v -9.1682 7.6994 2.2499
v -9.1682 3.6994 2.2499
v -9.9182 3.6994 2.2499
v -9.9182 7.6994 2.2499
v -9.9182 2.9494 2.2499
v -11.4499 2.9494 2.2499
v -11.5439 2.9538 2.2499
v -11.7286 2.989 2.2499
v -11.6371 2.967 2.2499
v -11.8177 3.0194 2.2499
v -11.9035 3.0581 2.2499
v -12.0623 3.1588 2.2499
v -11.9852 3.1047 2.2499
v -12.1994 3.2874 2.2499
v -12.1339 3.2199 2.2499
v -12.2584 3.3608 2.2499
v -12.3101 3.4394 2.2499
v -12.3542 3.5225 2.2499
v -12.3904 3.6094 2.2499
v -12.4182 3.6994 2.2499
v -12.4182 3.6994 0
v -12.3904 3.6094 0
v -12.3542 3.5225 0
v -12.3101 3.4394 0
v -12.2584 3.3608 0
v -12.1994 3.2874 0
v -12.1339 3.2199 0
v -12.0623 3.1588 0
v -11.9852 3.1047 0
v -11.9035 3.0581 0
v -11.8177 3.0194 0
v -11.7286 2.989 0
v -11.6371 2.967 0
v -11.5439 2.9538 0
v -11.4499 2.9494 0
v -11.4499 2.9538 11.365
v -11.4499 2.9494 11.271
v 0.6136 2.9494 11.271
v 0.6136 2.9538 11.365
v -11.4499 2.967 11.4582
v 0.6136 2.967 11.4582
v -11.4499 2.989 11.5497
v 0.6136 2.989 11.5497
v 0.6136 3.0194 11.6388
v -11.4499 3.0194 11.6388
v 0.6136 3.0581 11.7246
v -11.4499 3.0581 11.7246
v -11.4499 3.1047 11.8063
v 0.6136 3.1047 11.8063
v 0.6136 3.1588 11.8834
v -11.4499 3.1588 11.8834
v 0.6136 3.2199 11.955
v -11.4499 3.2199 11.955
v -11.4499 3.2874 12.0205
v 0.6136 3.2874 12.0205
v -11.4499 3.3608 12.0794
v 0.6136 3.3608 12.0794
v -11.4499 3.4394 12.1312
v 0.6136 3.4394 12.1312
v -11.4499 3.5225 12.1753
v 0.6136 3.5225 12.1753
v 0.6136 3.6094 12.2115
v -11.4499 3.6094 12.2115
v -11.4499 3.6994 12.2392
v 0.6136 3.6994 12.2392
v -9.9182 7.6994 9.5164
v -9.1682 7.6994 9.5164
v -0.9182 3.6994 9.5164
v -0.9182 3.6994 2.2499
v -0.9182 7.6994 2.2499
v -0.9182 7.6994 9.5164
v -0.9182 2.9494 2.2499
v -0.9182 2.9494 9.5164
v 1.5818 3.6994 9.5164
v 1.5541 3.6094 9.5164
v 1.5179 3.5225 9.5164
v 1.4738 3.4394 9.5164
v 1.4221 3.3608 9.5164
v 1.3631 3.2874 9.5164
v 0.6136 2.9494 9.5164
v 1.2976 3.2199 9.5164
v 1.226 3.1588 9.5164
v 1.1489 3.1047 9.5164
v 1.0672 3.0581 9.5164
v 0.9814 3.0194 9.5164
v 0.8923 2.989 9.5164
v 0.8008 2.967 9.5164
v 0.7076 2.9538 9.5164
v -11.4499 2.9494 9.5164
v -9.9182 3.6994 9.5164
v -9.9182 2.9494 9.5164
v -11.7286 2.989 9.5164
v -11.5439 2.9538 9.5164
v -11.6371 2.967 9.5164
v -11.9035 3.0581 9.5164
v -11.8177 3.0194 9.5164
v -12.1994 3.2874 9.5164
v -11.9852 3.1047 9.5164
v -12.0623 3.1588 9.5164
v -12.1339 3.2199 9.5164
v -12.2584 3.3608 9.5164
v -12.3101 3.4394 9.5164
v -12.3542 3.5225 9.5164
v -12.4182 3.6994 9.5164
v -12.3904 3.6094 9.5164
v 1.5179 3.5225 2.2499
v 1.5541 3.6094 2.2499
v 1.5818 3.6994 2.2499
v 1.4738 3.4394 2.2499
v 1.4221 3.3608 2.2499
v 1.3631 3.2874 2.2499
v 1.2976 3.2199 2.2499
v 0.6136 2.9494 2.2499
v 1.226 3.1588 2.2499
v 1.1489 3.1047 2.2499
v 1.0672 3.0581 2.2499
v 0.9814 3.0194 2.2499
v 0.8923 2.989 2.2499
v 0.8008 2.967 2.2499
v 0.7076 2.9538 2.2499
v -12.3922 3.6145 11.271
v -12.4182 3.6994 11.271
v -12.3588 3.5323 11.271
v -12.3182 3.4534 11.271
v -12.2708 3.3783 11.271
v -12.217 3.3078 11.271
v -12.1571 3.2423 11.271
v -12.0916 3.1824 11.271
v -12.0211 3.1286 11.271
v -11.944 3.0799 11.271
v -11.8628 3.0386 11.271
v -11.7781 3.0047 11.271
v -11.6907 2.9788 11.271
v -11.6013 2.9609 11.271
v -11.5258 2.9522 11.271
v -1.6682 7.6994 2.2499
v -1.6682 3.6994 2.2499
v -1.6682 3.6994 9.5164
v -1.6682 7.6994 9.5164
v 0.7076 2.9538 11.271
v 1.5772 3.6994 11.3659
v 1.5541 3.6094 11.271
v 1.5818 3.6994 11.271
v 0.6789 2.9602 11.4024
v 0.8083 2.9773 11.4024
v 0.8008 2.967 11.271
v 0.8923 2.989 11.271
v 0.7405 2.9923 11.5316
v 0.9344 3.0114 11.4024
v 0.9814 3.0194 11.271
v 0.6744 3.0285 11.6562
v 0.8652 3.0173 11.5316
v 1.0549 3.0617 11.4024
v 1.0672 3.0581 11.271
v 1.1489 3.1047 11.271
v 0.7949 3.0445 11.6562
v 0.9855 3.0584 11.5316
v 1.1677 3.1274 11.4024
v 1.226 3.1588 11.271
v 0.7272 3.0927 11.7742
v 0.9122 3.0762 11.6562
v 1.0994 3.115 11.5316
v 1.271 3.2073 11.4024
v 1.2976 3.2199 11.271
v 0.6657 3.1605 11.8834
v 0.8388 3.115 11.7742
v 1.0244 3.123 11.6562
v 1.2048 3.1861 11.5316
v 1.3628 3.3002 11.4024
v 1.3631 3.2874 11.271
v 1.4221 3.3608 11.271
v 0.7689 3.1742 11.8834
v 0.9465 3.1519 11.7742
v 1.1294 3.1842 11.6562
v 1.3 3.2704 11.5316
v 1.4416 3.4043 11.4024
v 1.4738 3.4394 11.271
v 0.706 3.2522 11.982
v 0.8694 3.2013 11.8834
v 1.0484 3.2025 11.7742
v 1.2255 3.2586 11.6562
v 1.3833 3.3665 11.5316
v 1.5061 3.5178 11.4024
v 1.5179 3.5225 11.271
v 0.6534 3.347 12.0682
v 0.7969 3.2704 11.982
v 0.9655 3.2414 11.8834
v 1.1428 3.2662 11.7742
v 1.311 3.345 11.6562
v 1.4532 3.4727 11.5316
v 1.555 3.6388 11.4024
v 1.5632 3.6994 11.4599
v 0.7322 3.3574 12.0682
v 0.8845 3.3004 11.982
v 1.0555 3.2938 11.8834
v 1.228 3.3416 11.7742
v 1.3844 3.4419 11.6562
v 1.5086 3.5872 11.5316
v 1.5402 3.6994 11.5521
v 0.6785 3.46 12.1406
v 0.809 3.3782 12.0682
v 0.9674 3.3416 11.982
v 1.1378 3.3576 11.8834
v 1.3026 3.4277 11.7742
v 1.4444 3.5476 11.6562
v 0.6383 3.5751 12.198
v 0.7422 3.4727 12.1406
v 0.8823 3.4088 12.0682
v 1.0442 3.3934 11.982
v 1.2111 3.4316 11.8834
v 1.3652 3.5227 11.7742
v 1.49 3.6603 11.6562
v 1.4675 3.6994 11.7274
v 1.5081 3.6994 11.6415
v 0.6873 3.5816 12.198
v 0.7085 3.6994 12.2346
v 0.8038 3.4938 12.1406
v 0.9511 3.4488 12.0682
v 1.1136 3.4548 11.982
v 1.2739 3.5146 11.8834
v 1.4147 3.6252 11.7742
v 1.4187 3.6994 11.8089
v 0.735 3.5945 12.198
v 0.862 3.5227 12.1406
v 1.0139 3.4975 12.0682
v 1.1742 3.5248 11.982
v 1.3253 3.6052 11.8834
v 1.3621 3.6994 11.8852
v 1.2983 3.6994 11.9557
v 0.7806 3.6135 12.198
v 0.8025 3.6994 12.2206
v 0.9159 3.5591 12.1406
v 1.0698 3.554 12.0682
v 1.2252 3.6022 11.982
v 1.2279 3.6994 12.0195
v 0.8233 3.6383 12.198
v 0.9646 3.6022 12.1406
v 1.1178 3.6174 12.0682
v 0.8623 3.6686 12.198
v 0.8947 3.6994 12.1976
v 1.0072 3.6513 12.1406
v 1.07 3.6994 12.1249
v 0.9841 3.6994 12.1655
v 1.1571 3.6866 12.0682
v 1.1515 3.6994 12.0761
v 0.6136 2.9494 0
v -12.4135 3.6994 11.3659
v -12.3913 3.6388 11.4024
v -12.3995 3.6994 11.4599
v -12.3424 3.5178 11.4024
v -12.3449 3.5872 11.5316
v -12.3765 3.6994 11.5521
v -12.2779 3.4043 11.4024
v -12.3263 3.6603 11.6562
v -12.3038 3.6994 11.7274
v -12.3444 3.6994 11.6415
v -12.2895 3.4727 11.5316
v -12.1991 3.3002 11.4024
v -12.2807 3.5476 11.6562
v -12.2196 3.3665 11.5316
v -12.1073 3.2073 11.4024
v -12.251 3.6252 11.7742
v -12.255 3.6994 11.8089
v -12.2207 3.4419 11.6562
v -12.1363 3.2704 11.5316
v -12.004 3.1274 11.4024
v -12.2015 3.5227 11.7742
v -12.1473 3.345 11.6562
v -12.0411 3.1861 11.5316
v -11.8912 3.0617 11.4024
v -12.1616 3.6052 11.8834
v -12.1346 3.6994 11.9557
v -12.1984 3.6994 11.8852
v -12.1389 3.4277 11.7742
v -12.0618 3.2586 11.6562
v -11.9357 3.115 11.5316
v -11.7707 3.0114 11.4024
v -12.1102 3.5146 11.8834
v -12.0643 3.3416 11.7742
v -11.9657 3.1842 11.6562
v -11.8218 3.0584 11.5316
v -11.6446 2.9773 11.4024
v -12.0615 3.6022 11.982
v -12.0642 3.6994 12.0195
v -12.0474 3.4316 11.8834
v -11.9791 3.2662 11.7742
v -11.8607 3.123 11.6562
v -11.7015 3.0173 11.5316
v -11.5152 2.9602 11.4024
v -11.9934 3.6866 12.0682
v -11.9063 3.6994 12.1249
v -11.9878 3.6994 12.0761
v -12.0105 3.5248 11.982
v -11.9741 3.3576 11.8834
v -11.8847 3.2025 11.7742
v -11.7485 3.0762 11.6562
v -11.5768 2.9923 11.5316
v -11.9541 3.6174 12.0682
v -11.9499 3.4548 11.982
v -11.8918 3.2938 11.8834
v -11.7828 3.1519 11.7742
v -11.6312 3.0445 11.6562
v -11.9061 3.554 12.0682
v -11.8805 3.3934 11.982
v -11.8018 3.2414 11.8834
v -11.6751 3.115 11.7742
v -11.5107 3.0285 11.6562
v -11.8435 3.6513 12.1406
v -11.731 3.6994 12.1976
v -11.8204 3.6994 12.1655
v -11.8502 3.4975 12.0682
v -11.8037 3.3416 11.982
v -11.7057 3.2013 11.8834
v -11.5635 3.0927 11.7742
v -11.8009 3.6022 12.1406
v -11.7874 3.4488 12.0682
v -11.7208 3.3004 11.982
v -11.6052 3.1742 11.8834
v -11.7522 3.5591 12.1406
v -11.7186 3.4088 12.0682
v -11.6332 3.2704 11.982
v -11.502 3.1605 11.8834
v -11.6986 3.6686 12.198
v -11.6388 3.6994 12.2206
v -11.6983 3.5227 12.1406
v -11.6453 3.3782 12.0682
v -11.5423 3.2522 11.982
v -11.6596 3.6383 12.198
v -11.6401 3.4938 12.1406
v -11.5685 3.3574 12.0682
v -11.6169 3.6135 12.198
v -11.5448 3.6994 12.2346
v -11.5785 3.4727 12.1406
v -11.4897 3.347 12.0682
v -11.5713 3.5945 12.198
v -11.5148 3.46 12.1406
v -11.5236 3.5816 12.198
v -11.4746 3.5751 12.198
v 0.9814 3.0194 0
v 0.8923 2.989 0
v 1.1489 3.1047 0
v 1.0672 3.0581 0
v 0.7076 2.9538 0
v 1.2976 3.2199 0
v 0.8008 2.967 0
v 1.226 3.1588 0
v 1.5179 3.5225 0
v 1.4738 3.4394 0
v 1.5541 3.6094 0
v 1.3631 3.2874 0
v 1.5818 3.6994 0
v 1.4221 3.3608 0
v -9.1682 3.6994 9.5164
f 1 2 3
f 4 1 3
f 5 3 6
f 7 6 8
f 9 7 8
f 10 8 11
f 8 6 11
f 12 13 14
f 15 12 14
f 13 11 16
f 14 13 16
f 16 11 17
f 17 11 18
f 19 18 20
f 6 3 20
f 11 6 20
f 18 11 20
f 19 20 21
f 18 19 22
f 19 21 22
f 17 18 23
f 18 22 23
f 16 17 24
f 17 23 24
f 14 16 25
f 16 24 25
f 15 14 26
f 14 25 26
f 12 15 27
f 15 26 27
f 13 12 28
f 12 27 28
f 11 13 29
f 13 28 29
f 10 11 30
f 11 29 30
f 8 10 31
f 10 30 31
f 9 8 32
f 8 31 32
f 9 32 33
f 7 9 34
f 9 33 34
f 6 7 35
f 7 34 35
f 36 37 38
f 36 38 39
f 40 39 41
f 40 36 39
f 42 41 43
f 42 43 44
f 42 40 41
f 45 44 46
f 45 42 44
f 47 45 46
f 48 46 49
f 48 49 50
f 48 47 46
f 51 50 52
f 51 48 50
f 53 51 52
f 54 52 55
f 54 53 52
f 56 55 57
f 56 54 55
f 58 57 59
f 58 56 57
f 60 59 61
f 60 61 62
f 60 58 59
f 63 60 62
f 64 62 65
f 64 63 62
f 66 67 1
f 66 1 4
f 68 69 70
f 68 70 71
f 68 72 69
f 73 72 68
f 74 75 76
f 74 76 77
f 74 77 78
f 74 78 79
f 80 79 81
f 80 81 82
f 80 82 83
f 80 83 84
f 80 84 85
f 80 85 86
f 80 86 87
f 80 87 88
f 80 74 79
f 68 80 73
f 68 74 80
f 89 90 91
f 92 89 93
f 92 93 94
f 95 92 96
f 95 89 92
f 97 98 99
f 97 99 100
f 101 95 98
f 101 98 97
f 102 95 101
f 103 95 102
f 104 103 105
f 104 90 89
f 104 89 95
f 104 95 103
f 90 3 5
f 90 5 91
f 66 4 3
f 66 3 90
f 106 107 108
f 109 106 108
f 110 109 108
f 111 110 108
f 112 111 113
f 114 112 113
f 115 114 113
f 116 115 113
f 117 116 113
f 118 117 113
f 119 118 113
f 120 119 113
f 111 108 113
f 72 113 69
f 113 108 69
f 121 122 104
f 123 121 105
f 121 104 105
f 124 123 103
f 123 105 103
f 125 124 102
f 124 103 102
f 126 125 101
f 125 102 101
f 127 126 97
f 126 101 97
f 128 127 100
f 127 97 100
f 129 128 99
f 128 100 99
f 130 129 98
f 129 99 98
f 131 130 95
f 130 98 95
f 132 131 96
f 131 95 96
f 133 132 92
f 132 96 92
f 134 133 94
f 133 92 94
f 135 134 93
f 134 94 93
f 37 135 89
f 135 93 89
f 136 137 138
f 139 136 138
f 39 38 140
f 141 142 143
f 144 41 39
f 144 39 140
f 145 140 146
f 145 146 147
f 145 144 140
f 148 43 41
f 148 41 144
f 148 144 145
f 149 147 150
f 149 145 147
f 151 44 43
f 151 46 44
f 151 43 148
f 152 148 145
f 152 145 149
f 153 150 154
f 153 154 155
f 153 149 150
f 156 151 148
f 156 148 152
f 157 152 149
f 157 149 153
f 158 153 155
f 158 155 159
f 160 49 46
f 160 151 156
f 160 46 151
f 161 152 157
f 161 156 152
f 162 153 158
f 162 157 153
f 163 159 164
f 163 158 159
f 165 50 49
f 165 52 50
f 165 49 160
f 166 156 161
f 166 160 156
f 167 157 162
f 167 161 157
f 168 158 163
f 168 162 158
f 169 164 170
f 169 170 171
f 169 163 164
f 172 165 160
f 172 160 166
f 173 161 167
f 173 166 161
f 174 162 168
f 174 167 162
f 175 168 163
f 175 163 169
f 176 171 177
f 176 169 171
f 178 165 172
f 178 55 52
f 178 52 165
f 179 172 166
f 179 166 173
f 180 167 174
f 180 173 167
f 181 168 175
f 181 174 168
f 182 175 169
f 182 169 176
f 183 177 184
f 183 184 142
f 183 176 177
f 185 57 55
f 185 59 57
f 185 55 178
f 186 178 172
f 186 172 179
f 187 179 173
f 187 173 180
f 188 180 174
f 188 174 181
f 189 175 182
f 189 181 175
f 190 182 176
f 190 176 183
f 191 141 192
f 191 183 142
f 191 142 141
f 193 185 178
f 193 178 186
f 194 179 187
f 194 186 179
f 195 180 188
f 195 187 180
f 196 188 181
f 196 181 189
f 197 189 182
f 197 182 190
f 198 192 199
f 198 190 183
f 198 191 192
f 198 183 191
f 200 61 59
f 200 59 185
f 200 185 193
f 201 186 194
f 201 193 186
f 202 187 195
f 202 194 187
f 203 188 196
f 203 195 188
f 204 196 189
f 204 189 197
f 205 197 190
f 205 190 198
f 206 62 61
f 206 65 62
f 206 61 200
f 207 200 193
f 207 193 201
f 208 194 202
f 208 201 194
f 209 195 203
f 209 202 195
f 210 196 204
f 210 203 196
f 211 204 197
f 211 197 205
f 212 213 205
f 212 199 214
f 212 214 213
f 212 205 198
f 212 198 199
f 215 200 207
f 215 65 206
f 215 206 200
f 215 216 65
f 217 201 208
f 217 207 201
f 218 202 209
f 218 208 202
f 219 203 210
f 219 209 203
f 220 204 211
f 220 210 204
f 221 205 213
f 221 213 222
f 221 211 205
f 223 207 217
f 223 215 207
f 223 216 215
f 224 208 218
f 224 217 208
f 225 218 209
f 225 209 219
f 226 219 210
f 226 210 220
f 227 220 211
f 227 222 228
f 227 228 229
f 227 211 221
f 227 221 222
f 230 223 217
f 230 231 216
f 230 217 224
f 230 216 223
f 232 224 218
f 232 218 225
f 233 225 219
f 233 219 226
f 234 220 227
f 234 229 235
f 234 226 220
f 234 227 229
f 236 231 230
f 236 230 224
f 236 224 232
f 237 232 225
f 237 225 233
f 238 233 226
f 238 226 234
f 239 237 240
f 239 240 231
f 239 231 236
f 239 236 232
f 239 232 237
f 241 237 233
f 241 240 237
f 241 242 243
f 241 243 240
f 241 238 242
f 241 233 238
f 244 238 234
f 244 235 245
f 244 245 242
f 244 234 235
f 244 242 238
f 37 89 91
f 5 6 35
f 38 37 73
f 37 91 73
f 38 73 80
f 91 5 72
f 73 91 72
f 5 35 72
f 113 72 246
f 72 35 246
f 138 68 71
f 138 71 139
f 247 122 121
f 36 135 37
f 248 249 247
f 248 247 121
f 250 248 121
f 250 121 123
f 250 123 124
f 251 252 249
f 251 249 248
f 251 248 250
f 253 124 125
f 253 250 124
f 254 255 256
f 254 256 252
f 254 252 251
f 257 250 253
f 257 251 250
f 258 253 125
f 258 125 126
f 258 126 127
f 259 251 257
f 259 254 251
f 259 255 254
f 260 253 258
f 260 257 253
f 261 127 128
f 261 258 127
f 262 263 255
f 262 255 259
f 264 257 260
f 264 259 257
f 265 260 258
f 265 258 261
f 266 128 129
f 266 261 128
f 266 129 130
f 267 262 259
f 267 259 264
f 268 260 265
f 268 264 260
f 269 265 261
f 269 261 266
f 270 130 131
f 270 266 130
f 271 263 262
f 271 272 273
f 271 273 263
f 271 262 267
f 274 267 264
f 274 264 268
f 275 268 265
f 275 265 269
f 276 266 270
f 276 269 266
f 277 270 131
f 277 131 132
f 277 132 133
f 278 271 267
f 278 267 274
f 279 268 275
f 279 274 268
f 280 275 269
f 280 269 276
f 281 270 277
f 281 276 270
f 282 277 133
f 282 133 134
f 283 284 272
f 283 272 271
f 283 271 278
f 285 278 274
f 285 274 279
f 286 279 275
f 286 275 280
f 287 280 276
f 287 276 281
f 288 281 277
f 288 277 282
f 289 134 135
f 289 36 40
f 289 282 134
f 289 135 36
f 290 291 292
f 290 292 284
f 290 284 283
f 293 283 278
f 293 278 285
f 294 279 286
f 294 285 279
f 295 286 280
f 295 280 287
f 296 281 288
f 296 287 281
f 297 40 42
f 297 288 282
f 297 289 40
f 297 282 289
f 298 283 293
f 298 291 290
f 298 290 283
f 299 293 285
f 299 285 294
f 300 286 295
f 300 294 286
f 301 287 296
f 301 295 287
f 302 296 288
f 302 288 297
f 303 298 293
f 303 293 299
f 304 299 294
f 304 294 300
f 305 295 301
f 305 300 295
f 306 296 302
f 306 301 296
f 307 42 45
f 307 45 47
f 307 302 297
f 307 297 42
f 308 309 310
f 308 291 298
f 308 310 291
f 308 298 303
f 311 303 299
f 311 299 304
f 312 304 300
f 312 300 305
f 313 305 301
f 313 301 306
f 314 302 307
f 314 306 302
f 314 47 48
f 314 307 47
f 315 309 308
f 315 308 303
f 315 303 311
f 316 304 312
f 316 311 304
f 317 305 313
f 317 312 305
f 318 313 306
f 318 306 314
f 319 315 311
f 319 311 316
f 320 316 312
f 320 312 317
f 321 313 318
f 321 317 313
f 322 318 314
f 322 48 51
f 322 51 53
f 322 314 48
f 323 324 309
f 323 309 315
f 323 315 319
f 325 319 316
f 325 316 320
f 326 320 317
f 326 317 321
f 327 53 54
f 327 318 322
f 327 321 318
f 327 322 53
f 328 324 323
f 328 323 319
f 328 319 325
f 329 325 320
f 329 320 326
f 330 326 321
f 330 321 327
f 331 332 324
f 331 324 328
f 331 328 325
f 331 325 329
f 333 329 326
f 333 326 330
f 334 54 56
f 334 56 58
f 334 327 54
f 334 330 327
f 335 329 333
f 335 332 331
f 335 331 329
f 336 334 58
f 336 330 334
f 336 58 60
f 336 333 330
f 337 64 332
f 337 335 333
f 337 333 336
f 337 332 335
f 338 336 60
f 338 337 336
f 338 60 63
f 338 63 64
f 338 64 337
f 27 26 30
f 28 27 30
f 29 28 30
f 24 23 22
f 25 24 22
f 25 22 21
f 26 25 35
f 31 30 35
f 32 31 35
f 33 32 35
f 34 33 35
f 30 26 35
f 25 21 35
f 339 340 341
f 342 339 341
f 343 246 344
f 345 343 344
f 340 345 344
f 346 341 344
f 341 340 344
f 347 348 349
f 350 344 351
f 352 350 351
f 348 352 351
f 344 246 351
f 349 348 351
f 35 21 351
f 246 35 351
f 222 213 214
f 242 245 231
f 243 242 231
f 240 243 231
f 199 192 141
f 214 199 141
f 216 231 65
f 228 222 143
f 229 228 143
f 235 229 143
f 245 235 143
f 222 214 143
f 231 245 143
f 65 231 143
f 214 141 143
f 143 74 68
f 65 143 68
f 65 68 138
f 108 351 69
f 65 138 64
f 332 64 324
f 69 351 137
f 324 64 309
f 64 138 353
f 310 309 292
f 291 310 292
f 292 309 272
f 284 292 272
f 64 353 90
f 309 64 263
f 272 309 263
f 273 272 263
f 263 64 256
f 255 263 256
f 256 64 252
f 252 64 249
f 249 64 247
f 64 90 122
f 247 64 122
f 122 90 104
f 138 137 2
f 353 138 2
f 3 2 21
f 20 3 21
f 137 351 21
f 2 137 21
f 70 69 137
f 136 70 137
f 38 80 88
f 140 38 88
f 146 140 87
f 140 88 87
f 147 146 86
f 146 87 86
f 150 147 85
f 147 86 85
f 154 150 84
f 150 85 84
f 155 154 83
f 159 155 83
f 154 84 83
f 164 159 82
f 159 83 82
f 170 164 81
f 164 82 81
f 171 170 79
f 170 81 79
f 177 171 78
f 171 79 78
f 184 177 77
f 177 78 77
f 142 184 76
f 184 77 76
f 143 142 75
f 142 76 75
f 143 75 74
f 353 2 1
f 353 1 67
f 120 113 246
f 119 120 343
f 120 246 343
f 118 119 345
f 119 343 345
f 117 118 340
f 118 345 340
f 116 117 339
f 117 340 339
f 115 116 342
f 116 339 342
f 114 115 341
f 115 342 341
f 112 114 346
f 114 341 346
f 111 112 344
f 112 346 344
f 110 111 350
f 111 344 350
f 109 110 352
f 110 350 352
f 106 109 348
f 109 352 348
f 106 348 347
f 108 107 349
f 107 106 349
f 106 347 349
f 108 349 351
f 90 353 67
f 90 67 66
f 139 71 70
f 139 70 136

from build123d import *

# Parameters (mm, degrees)
F1_DEPTH    = 12.271
F2_T1_DEPTH = 12.0635083269
F2_T4_ANGLE = 218.8024505591
F2_T6_ANGLE = 218.8024505591
F3_W        = 2.5
F3_H        = 7.2664258366
F4_DEPTH    = 0.751
F5_W        = 0.75
F5_H        = 7.2664258366
F6_DEPTH    = 4


# Not quite as in the source:
# - a fillet or chamfer that OpenCascade refuses, or shapes differently, is made with other operations: its cross-section is extruded or revolved along the edge and cut away or added


with BuildPart() as f1:
    # F0 (on Top) → F1 (new body)
    with BuildSketch(Plane.XY):
        with BuildLine():
            Line((1.5818497799, 3.6993569562), (-12.4181502201, 3.6993569562))
            ThreePointArc((-12.4181502201, 3.6993569562), (-12.0622768192, 3.1587875411), (-11.4499043835, 2.9493569562))
            Line((-11.4499043835, 2.9493569562), (0.6136039434, 2.9493569562))
            ThreePointArc((0.6136039434, 2.9493569562), (1.2259763791, 3.1587875411), (1.5818497799, 3.6993569562))
        make_face()
    extrude(amount=F1_DEPTH)

    # F2: fillet of radius 1 on 1 edges, made by hand

    # F2_s2 → F2_t1 (cut)
    with BuildSketch(Plane.YZ.offset(-11.4499043835)):
        with BuildLine():
            ThreePointArc((2.9493569562, 11.271), (3.242250175, 11.9781067812), (3.9493569562, 12.271))
            Line((3.9493569562, 12.271), (2.9493569562, 12.271))
            Line((2.9493569562, 12.271), (2.9493569562, 11.271))
        make_face()
    extrude(amount=F2_T1_DEPTH, mode=Mode.SUBTRACT)

    # F2_s3 → F2_t4 (revolve, cut)
    with BuildSketch(Plane(origin=(-8.8824733702, 7.1423174648, 0), x_dir=(0, 0, 1), z_dir=(0.7793111642, -0.6266371433, 0))):
        with BuildLine():
            ThreePointArc((11.271, 3.0971574071), (11.9781067812, 3.3900506259), (12.271, 4.0971574071))
            Line((12.271, 4.0971574071), (12.271, 3.0971574071))
            Line((12.271, 3.0971574071), (11.271, 3.0971574071))
        make_face()
    revolve(axis=Axis((-11.4499043835, 3.9493569562, 12.271), (0, 0, 1)), revolution_arc=F2_T4_ANGLE, mode=Mode.SUBTRACT)

    # F2_s5 → F2_t6 (revolve, cut)
    with BuildSketch(Plane.YZ.offset(0.6136039434)):
        with BuildLine():
            ThreePointArc((2.9493569562, 11.271), (3.242250175, 11.9781067812), (3.9493569562, 12.271))
            Line((3.9493569562, 12.271), (2.9493569562, 12.271))
            Line((2.9493569562, 12.271), (2.9493569562, 11.271))
        make_face()
    revolve(axis=Axis((0.6136039434, 3.9493569562, 12.271), (0, 0, 1)), revolution_arc=F2_T6_ANGLE, mode=Mode.SUBTRACT)

    # F3 (on face) → F4 (cut, through all)
    with BuildSketch(Plane(origin=(0, 3.6993569562, 0), x_dir=(-1, 0, 0), z_dir=(0, 1, 0))):
        with Locations((11.1681502201, 5.8831429183)):
            Rectangle(F3_W, F3_H)
        with Locations((-0.3318497799, 5.8831429183)):
            Rectangle(F3_W, F3_H)
    extrude(amount=-F4_DEPTH, mode=Mode.SUBTRACT)

    # F5 (on face) → F6 (join)
    with BuildSketch(Plane(origin=(0, 3.6993569562, 0), x_dir=(-1, 0, 0), z_dir=(0, 1, 0))):
        with Locations((1.2931502201, 5.8831429183)):
            Rectangle(F5_W, F5_H)
        with Locations((9.5431502201, 5.8831429183)):
            Rectangle(F5_W, F5_H)
    extrude(amount=F6_DEPTH)


solid = f1.part
